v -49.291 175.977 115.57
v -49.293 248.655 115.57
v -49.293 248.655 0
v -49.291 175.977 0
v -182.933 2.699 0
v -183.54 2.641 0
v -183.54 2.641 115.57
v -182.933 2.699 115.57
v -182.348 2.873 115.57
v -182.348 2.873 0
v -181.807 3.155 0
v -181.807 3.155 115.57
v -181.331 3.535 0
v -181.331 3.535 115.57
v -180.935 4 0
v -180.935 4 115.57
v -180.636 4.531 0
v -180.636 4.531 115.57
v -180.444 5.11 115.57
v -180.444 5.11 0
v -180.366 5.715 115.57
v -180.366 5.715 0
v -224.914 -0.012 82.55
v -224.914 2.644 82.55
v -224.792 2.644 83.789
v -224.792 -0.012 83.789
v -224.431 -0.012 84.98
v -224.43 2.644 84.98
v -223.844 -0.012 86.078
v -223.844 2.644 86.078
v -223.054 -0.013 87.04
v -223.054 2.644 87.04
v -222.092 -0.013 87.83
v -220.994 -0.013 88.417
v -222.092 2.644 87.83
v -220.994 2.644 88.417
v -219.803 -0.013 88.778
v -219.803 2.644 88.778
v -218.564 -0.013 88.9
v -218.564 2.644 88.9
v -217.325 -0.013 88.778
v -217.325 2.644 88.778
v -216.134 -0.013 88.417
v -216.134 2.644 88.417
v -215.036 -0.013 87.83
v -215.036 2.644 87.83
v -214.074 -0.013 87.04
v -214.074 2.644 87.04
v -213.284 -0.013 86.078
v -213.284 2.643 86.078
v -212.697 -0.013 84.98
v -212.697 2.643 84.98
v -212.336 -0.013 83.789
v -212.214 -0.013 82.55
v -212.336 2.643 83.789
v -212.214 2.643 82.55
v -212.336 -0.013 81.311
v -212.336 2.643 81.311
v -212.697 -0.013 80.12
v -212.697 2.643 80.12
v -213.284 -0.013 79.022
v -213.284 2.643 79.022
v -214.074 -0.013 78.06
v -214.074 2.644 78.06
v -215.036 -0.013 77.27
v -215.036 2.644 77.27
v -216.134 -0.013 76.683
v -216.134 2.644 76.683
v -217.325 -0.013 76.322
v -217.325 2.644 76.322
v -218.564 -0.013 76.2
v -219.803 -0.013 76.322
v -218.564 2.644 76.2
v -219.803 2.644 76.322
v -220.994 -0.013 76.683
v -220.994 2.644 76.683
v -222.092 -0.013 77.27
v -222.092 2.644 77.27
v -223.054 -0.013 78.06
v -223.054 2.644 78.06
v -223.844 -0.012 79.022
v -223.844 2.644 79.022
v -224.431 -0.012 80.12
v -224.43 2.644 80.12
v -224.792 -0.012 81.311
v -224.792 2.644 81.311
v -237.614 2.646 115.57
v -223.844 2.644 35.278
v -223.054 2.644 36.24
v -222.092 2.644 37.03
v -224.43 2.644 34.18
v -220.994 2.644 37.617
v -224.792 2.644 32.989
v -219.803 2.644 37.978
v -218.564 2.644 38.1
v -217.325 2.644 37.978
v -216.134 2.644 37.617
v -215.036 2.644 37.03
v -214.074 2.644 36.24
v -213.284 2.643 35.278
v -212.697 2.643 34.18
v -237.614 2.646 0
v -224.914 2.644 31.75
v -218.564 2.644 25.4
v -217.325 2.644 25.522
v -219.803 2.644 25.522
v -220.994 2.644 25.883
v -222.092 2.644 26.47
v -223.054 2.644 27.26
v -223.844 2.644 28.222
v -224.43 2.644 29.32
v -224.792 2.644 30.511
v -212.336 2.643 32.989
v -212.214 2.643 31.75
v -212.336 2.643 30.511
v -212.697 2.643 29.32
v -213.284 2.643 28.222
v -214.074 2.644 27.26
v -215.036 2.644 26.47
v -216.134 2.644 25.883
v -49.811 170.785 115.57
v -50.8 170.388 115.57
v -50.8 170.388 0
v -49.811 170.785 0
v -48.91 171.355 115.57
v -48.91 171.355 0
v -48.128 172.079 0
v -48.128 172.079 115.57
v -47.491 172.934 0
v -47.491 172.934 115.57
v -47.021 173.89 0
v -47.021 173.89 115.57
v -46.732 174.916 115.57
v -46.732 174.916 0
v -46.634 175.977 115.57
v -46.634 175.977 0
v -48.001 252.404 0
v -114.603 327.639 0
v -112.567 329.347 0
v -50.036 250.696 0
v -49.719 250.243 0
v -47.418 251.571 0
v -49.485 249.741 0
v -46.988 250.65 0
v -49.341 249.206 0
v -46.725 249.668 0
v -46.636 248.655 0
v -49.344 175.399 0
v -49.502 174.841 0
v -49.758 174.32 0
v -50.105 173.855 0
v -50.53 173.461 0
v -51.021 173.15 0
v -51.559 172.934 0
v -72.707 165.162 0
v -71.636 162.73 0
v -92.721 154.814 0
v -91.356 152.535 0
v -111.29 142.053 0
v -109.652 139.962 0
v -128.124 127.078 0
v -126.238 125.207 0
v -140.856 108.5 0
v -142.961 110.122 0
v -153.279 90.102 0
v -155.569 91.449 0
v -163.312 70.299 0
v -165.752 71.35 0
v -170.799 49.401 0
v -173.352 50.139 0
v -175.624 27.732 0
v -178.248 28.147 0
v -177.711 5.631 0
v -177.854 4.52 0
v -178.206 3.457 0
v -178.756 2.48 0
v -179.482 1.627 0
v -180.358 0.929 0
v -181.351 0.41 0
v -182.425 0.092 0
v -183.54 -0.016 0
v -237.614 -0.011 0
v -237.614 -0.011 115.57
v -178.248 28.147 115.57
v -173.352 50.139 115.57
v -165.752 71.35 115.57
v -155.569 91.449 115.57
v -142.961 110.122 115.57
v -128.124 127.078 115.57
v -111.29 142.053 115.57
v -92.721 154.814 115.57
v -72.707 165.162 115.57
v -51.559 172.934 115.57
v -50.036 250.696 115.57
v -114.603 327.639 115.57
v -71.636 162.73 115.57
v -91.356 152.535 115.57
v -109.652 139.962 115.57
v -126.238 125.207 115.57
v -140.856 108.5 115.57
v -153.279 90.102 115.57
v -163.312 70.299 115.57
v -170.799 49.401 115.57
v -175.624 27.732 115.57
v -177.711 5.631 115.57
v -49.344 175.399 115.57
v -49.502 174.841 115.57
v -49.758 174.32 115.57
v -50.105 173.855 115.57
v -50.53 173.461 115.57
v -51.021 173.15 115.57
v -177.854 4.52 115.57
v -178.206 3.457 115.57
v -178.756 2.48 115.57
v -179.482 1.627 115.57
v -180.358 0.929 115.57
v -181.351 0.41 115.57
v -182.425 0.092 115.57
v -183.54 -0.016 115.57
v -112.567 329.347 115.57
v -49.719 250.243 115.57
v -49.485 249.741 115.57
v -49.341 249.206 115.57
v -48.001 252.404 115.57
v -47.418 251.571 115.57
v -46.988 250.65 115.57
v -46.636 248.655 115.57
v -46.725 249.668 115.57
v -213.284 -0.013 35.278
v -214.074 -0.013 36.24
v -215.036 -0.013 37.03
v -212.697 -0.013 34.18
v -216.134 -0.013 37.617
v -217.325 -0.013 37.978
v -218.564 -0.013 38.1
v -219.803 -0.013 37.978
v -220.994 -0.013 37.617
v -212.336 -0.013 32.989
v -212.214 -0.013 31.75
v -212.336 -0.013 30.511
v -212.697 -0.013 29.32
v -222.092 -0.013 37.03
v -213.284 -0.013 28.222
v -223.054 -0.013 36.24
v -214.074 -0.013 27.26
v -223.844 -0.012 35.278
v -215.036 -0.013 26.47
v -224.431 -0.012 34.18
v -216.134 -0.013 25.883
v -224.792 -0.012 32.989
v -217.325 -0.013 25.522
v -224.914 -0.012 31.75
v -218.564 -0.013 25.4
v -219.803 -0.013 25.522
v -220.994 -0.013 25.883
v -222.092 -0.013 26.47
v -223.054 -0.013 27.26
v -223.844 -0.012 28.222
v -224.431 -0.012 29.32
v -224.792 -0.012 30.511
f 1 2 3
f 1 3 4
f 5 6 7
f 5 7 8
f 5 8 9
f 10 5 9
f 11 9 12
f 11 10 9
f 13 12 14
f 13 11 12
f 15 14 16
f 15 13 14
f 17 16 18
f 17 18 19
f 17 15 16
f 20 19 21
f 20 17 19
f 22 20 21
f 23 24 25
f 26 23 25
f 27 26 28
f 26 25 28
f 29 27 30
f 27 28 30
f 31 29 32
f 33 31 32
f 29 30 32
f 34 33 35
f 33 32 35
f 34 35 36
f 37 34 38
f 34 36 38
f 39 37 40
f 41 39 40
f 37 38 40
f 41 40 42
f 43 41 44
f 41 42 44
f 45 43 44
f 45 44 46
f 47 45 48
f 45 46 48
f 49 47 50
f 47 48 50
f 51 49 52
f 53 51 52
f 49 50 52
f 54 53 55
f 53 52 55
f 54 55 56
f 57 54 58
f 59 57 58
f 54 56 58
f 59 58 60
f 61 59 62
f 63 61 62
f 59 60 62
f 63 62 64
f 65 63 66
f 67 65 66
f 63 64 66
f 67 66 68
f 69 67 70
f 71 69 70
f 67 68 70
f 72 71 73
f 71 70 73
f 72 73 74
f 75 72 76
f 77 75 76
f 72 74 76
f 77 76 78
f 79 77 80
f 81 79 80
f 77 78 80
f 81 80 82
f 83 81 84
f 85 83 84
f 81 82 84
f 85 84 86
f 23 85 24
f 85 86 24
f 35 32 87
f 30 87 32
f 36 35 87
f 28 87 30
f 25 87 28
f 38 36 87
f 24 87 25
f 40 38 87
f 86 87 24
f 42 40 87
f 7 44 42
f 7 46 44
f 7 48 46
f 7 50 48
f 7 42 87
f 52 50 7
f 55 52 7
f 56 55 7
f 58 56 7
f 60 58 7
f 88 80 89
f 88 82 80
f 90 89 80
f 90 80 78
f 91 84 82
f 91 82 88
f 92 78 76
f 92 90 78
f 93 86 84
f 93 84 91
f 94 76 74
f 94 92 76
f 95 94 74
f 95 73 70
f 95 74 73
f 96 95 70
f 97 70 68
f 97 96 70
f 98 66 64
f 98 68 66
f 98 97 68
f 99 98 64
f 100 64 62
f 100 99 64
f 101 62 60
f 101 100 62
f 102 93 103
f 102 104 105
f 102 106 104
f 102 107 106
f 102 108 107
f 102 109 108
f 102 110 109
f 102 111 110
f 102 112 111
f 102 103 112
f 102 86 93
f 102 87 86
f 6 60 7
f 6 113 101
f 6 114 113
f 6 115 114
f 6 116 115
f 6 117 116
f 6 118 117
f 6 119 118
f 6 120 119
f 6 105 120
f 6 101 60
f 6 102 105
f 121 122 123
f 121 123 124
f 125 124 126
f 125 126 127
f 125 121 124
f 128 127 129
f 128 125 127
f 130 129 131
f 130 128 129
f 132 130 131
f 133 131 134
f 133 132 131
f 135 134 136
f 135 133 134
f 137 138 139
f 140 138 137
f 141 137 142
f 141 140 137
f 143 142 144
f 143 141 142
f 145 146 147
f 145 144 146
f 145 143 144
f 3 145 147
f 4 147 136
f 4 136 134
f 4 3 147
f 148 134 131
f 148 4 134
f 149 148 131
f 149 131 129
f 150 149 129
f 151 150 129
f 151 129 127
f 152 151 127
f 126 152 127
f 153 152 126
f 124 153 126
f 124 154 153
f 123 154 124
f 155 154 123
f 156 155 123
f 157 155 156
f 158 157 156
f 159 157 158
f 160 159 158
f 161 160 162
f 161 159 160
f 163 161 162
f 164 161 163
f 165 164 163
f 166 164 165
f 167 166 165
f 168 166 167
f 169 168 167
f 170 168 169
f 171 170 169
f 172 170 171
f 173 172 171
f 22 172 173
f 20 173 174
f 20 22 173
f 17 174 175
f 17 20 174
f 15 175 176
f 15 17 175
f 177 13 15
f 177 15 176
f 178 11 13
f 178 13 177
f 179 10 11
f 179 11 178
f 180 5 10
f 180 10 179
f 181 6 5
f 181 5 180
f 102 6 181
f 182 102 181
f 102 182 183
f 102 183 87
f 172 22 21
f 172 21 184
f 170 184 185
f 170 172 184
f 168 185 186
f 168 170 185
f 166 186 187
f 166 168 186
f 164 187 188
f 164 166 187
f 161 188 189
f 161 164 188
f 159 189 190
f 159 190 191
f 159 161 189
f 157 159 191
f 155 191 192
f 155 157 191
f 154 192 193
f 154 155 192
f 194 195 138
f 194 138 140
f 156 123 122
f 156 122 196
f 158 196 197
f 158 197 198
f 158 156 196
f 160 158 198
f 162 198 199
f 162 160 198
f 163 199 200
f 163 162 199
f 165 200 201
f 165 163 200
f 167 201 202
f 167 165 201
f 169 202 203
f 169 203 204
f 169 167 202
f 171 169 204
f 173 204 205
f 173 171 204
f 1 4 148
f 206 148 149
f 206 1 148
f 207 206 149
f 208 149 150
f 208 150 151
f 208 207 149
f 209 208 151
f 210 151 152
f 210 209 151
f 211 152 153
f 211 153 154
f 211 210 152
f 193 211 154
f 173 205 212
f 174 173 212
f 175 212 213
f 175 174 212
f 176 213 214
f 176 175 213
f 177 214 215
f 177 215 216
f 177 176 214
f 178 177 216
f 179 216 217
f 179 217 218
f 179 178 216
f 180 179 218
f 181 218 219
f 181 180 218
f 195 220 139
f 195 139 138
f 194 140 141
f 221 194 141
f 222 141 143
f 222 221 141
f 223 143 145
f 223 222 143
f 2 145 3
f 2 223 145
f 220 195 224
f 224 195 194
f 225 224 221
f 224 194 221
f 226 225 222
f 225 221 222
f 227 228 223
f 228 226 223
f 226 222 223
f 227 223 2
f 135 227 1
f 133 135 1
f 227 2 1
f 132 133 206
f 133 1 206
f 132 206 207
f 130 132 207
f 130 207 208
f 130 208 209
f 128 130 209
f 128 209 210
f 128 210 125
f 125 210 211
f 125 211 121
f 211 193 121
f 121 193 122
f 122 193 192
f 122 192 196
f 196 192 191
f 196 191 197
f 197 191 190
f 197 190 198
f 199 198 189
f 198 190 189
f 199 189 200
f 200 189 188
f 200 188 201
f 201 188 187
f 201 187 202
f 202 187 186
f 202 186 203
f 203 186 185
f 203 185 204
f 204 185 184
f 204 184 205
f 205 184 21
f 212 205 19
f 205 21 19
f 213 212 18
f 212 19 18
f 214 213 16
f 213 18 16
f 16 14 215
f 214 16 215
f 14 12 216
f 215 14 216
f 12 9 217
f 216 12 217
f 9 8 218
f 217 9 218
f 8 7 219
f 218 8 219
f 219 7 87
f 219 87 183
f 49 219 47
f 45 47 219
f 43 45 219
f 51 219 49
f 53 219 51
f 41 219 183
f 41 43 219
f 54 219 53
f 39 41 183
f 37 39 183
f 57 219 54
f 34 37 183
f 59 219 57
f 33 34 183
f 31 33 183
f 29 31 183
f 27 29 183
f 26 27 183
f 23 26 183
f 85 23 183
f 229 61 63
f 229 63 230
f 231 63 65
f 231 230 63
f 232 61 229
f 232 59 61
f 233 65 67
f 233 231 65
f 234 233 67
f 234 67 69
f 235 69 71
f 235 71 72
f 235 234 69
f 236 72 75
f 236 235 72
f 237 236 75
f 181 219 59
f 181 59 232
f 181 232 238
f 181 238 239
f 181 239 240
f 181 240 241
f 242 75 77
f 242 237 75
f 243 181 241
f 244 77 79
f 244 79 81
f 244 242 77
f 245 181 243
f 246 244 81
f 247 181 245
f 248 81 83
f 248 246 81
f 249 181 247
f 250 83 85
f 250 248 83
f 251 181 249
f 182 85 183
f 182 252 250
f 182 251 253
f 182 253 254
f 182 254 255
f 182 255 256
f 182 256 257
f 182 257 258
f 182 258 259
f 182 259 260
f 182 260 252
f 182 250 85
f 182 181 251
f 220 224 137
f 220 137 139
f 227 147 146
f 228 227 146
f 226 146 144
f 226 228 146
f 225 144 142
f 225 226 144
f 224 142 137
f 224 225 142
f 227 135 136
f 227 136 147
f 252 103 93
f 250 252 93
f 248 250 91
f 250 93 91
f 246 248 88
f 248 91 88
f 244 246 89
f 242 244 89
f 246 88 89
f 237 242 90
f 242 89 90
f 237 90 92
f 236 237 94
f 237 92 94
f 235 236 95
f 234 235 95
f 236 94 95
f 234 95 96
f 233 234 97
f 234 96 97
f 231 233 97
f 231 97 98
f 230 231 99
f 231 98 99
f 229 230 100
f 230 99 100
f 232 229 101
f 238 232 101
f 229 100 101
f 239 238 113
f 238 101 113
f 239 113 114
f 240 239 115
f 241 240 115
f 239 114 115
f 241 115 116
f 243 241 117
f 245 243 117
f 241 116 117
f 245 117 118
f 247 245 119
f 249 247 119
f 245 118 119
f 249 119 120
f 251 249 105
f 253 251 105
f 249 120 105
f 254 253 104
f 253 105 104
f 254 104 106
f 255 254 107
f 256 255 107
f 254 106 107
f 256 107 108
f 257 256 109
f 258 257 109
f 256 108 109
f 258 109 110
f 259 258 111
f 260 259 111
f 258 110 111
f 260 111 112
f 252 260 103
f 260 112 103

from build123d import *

# Parameters (mm, degrees)
BASE_FLANGE1_DEPTH           = 115.57
EDGE_FLANGE1_DEPTH           = 115.57
EDGE_FLANGE2_STRIP_CUT_DEPTH = 115.57
EDGE_FLANGE2_DEPTH           = 115.57
EDGE_FLANGE3_DEPTH           = 115.57
SKETCH20_R                   = 6.35
CUT_EXTRUDE1_DEPTH           = 2.65684


# Sheet-metal steps are written as plain solids
with BuildPart() as part:
    # Sketch1 → Base-Flange1 (new body)
    with BuildSketch(Plane.XY):
        with BuildLine():
            ThreePointArc((-50.8, 170.388379885), (-140.856418383, 108.500273734), (-177.710803869, 5.63118))
            Line((-177.710803869, 5.63118), (-180.366311024, 5.715325918))
            ThreePointArc((-180.366311024, 5.715325918), (-142.961215721, 110.121577824), (-51.559097143, 172.934469105))
            Line((-51.559097143, 172.934469105), (-50.8, 170.388379885))
        make_face()
    extrude(amount=BASE_FLANGE1_DEPTH)

    # Edge-Flange1 section (across the edge) → Edge-Flange1 (add)
    with BuildSketch(Plane(origin=(-49.291175996, 173.610632552, 115.57), x_dir=(-0.9999999996342678, -2.7045604981235094e-05, 0), z_dir=(0, 0, -1))):
        with BuildLine():
            Line((-2.65684, 2.366572064), (-2.65684, 76.2))
            Line((-2.65684, 76.2), (0, 76.2))
            Line((0, 76.2), (0, 2.366572064))
            ThreePointArc((0, 2.366572064), (0.62936233, 0.469112223), (2.267939433, -0.676102109))
            Line((2.267939433, -0.676102109), (1.508911151, -3.222211858))
            ThreePointArc((1.508911151, -3.222211858), (-1.500827273, -1.118682173), (-2.65684, 2.366572064))
        make_face()
    extrude(amount=EDGE_FLANGE1_DEPTH)

    # Edge-Flange2 strip (across the edge) → Edge-Flange2 strip cut (cut)
    with BuildSketch(Plane(origin=(-49.293236871, 249.810632524, 115.57), x_dir=(-0.766027058259036, -0.6428083275868535, 0), z_dir=(0, 0, -1))):
        Polygon((-12.205285278, 10.412383287), (-1.292448625, -2.593029), (0.742808893, -0.885245167), (-10.17002776, 12.12016712), align=None)
    extrude(amount=EDGE_FLANGE2_STRIP_CUT_DEPTH, mode=Mode.SUBTRACT)

    # Edge-Flange2 section (across the edge) → Edge-Flange2 (add)
    with BuildSketch(Plane(origin=(-49.293236871, 249.810632524, 115.57), x_dir=(-0.766027058259036, -0.6428083275868535, 0), z_dir=(0, 0, -1))):
        with BuildLine():
            Line((-2.65684, 1.155605494), (-2.65684, 101.6))
            Line((-2.65684, 101.6), (0, 101.6))
            Line((0, 101.6), (0, 1.155605494))
            ThreePointArc((0, 1.155605494), (0.191475929, 0.069691539), (0.742808893, -0.885245167))
            Line((0.742808893, -0.885245167), (-1.292448625, -2.593029))
            ThreePointArc((-1.292448625, -2.593029), (-2.305137014, -0.839001259), (-2.65684, 1.155605494))
        make_face()
    extrude(amount=EDGE_FLANGE2_DEPTH)

    # Edge-Flange3 section (across the edge) → Edge-Flange3 (add)
    with BuildSketch(Plane(origin=(-180.463740314, 2.640617339, 0), x_dir=(8.626632785422443e-05, 0.9999999962790604, 0), z_dir=(0, 0, 1))):
        with BuildLine():
            Line((-2.65684, 3.076251829), (-2.65684, 57.15))
            Line((-2.65684, 57.15), (0, 57.15))
            Line((0, 57.15), (0, 3.076251829))
            ThreePointArc((0, 3.076251829), (0.894756196, 0.86692768), (3.074716973, -0.097164046))
            Line((3.074716973, -0.097164046), (2.990800136, -2.75267845))
            ThreePointArc((2.990800136, -2.75267845), (-1.013351819, -0.981834768), (-2.65684, 3.076251829))
        make_face()
    extrude(amount=EDGE_FLANGE3_DEPTH)

    # Sketch20 → Cut-Extrude1 (cut)
    with BuildSketch(Plane(origin=(0.000226453, 2.625049375, 0), x_dir=(0.9999999962790604, -8.626632785420363e-05, 0), z_dir=(8.626632785420363e-05, 0.9999999962790604, 0))):
        with Locations(Location((-218.563967439, -31.75, 0), (0, 0, 180))):
            Circle(SKETCH20_R)
        with Locations(Location((-218.563967439, -82.55, 0), (0, 0, 180))):
            Circle(SKETCH20_R)
    extrude(amount=-CUT_EXTRUDE1_DEPTH, mode=Mode.SUBTRACT)


solid = part.part
